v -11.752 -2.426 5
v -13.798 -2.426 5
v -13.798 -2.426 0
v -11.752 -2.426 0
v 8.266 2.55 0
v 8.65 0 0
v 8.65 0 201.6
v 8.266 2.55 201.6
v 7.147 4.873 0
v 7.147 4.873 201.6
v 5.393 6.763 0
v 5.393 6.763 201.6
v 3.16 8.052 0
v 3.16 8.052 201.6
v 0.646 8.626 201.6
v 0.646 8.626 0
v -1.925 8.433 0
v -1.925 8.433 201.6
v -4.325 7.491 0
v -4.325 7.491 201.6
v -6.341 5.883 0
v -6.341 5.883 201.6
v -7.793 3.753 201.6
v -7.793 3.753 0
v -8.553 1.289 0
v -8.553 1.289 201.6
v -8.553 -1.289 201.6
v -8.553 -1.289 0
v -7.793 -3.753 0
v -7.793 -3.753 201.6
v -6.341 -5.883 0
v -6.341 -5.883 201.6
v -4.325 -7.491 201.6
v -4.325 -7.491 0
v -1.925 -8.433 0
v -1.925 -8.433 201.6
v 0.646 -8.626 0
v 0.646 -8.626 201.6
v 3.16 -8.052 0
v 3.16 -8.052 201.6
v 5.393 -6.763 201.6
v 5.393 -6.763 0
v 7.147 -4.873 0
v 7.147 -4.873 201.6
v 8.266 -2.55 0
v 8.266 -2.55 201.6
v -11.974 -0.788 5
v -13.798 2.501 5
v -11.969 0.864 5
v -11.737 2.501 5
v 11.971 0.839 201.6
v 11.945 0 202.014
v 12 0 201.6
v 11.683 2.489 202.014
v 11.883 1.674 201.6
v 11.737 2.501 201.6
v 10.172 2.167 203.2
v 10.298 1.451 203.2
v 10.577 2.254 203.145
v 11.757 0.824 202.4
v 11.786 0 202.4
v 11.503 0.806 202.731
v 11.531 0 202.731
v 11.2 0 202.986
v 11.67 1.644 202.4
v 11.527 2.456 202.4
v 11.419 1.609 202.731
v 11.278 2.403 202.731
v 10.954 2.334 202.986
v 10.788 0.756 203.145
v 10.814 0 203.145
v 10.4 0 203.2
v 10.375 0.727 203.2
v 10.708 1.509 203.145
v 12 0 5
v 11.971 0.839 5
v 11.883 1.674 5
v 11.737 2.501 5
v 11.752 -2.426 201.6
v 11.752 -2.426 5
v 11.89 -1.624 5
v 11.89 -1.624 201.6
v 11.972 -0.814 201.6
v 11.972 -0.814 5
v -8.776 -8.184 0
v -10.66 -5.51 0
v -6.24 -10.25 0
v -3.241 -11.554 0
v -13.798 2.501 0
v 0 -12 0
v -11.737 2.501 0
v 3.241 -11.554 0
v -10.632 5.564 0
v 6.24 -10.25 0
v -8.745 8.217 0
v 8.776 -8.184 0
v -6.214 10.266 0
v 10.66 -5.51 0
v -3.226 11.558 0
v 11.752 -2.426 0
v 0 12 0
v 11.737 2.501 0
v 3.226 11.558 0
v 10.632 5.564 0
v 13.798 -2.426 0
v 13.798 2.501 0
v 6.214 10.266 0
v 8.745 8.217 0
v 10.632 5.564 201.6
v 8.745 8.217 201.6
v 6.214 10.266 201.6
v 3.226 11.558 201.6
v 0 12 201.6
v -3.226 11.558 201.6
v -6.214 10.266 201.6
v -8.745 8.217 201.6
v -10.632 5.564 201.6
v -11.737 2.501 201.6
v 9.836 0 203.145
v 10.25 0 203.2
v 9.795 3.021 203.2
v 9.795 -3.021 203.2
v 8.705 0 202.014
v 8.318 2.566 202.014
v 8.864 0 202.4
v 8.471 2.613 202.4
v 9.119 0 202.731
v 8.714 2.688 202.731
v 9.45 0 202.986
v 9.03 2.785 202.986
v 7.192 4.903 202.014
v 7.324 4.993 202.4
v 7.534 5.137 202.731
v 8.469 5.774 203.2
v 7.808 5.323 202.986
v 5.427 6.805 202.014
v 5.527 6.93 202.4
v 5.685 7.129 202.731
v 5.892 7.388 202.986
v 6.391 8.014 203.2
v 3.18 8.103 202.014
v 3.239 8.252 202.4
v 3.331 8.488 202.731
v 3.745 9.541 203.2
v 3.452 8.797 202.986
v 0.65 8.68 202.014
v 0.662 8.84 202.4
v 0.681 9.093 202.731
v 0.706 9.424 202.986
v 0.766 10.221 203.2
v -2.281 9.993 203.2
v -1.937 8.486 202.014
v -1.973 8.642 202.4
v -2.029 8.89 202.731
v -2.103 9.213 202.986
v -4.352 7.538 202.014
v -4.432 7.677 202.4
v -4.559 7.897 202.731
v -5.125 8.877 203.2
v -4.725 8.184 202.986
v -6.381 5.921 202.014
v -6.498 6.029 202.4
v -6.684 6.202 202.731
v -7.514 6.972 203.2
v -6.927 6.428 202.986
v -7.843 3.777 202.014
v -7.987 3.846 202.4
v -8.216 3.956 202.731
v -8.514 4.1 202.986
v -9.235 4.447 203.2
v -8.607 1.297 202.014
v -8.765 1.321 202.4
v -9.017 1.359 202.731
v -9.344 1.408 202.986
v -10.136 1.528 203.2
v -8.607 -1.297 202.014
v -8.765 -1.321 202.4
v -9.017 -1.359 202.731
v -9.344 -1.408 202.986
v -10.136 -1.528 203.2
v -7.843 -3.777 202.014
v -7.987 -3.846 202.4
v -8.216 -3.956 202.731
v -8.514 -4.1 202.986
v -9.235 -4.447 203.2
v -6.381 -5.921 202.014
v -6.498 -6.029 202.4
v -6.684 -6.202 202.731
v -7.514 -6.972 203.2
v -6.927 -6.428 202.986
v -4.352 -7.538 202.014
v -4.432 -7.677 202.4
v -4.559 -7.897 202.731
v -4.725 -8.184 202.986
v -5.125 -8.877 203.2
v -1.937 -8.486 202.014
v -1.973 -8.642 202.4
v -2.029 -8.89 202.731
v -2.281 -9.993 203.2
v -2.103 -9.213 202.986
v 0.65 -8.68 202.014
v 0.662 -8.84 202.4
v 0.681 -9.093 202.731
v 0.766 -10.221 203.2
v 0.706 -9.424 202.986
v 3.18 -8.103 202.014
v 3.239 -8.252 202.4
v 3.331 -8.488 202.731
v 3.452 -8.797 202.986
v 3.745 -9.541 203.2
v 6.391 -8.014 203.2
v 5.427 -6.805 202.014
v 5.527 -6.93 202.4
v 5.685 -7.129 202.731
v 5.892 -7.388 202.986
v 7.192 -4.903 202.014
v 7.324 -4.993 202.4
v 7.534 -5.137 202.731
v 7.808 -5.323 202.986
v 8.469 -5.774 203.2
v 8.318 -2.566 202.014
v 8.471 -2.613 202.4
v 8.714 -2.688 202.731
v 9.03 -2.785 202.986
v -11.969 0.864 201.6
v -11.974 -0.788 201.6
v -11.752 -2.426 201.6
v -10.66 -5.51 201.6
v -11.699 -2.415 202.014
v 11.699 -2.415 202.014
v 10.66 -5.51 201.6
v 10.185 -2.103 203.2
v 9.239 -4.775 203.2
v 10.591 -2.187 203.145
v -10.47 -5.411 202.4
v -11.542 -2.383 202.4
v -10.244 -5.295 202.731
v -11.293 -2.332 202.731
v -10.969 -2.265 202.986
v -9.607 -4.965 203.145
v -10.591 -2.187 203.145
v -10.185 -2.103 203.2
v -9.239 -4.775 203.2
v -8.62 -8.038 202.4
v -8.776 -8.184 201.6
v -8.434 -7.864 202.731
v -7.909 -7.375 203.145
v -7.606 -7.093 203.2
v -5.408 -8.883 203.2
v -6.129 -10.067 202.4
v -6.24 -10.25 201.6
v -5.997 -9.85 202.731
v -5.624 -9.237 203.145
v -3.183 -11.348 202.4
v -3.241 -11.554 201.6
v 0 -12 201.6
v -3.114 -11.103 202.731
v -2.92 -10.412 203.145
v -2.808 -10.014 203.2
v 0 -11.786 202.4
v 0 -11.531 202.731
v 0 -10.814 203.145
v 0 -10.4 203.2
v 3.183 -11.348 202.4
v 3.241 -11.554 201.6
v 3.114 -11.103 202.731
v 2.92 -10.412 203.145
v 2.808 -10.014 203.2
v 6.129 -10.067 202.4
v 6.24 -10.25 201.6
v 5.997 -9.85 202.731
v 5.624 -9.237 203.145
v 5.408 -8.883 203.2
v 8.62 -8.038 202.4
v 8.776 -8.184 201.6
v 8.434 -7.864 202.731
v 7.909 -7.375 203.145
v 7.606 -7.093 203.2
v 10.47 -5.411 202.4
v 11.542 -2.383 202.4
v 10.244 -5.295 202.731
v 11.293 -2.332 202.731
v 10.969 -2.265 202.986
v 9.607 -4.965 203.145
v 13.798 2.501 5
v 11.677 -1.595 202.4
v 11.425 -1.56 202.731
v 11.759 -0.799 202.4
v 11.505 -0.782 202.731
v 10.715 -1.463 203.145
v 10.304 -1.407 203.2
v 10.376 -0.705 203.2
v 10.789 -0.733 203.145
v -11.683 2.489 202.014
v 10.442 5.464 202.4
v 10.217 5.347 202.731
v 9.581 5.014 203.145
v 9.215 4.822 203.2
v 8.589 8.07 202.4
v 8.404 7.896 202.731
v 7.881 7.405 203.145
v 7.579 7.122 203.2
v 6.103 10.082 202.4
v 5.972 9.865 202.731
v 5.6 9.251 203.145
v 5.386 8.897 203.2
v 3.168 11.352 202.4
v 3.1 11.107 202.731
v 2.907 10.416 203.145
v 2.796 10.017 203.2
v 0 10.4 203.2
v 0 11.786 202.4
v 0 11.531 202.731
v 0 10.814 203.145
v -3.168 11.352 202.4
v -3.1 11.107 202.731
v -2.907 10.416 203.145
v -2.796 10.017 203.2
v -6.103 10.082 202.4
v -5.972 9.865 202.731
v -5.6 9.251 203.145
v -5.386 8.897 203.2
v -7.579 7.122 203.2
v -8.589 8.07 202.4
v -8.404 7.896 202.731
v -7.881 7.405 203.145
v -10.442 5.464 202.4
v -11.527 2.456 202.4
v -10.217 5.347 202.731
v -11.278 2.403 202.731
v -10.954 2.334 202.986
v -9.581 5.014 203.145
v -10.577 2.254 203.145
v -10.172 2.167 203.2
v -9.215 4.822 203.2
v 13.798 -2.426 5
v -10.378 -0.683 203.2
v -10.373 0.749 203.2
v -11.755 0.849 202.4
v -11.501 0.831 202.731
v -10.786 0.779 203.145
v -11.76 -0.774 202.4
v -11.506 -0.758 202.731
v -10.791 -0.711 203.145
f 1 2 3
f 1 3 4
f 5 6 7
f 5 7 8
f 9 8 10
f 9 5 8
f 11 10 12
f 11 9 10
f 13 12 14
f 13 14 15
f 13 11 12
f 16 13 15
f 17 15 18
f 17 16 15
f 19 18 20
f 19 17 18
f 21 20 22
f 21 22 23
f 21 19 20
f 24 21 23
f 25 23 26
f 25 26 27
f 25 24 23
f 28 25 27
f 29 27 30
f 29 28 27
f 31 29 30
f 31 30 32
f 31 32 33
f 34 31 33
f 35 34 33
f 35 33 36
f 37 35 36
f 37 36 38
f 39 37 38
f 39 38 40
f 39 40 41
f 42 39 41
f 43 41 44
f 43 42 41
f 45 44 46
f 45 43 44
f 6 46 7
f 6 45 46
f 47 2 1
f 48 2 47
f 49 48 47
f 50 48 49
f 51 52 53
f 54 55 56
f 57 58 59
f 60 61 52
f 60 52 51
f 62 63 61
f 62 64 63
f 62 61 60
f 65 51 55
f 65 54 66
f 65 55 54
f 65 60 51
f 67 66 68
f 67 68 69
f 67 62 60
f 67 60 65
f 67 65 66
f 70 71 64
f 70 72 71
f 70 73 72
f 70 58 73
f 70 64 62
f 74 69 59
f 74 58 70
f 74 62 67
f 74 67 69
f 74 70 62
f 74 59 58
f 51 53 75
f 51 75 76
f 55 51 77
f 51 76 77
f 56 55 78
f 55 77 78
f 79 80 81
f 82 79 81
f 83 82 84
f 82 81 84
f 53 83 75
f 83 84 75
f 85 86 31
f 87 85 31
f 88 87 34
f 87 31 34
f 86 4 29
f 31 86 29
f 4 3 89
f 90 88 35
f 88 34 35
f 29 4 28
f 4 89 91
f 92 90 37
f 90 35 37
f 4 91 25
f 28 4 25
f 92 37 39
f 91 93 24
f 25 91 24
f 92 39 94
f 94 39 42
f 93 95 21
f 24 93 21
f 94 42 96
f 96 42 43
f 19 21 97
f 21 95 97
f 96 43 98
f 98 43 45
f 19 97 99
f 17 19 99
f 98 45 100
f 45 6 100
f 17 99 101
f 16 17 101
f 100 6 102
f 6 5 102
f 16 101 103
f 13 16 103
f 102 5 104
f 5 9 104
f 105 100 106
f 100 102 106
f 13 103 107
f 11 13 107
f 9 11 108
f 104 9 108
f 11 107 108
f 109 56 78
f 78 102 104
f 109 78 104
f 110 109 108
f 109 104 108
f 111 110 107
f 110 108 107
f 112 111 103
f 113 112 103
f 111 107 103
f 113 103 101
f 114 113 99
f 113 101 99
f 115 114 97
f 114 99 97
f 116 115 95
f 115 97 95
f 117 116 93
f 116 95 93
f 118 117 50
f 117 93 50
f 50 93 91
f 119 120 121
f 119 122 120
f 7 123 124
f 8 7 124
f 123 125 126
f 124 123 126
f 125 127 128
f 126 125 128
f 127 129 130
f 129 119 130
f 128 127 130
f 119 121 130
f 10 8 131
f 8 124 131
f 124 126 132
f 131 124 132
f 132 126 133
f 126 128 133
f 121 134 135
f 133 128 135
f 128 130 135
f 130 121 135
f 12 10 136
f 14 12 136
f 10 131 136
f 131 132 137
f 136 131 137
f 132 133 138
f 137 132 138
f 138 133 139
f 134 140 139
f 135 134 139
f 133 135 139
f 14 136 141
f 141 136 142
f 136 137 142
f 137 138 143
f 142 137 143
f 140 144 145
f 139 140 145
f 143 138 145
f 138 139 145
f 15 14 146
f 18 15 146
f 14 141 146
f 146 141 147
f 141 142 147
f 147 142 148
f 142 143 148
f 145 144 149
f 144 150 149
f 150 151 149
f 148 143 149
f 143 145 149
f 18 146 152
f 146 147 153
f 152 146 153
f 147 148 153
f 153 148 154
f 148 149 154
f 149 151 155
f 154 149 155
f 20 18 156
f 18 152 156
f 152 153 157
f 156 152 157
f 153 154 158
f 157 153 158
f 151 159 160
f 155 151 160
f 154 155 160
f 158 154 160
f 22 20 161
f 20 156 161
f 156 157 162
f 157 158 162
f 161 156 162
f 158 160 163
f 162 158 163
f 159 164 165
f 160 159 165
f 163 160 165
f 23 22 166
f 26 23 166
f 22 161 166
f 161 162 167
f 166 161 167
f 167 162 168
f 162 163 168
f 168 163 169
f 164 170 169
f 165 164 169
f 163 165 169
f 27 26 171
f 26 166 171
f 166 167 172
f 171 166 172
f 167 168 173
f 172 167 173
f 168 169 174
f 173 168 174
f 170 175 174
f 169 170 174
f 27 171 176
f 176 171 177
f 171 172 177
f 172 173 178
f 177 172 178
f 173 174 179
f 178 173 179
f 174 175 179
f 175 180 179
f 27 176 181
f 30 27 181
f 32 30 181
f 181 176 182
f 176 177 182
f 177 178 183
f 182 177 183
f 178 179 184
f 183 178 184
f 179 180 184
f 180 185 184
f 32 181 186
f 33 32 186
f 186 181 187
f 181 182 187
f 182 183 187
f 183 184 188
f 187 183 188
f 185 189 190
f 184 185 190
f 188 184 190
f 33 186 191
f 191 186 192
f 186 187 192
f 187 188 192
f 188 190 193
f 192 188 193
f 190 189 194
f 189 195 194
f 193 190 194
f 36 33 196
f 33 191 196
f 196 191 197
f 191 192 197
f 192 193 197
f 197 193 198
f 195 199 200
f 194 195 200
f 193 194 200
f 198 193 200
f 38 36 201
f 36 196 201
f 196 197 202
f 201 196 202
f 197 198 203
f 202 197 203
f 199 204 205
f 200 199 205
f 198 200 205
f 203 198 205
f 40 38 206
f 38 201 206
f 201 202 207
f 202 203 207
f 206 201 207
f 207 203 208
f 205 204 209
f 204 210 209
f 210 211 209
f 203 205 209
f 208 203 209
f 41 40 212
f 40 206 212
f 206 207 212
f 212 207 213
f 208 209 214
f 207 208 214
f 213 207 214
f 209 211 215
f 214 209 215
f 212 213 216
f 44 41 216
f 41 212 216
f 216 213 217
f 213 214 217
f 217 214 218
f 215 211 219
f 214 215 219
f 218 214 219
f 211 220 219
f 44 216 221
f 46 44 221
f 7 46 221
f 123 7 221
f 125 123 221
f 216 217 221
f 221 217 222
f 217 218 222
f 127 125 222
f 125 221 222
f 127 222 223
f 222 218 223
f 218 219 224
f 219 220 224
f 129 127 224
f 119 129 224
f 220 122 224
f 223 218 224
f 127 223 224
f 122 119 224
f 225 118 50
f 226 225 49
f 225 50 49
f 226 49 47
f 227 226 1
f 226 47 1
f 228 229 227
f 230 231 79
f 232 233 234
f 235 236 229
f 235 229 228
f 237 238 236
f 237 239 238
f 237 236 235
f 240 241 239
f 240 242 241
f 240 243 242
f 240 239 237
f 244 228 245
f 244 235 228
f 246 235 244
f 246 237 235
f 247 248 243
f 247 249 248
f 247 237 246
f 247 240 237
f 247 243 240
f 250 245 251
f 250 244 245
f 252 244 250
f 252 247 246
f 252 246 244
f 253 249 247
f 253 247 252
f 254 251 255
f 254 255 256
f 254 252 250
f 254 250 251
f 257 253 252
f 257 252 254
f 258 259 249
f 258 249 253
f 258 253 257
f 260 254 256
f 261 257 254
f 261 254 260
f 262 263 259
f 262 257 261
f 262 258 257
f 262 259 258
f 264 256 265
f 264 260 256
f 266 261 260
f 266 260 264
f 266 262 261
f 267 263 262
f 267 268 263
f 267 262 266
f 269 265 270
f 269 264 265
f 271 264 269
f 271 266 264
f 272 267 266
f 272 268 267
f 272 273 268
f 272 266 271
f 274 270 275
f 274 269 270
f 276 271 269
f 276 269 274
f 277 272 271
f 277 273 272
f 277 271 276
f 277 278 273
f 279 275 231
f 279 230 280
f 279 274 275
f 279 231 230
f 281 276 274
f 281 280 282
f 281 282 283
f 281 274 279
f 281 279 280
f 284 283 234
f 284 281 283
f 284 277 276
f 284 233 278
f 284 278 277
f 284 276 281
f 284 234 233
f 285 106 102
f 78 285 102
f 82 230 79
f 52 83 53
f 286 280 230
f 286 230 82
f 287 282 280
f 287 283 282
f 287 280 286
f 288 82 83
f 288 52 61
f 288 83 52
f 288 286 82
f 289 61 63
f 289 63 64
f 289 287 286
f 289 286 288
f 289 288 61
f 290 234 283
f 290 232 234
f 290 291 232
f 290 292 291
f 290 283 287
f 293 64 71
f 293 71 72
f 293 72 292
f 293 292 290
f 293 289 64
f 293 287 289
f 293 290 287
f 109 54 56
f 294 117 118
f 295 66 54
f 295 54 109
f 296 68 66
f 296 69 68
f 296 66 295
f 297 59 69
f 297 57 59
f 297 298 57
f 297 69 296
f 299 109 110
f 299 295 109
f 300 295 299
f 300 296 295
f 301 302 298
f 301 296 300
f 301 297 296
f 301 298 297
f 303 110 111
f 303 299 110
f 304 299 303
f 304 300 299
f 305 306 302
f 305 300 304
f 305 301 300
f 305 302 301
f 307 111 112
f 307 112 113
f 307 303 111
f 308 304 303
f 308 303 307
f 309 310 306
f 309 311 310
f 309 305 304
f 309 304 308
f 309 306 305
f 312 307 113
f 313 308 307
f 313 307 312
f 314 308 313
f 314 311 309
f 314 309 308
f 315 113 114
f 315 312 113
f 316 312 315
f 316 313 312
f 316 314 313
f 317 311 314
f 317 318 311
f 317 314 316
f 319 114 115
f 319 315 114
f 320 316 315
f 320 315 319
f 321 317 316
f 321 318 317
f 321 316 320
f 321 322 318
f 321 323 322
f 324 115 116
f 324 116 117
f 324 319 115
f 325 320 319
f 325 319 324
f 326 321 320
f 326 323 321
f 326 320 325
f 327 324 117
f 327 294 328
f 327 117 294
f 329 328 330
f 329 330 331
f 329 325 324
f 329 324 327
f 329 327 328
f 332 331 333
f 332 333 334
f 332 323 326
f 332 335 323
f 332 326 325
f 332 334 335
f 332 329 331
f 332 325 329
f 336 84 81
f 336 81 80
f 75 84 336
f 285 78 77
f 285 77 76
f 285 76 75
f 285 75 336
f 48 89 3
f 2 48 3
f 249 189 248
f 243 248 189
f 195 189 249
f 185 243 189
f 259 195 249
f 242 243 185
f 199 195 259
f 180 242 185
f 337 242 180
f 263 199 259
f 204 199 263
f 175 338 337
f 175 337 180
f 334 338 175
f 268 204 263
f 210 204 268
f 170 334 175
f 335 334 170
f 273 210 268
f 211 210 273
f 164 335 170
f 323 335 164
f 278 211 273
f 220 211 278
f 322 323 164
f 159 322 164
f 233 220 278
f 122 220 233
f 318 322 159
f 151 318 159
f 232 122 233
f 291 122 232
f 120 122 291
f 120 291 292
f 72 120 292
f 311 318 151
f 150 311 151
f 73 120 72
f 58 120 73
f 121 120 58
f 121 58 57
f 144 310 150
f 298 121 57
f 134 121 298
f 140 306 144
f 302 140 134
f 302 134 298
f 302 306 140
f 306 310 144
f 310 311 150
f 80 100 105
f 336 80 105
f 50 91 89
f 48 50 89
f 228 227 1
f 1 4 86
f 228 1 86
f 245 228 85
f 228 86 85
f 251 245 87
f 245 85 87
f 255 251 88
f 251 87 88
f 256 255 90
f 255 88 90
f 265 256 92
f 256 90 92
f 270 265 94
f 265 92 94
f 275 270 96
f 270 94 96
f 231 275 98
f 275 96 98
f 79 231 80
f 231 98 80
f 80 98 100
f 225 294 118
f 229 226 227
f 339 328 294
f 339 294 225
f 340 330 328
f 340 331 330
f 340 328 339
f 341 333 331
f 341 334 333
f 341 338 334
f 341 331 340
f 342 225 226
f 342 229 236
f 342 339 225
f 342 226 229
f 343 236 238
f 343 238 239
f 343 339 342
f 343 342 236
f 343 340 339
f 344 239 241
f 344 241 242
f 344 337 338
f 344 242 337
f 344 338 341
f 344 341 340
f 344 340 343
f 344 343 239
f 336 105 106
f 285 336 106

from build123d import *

# Parameters (mm, degrees)
F0_R     = 8.65
F1_DEPTH = 203.2
F2_R     = 1.6
F3_DEPTH = 5


with BuildPart() as f1:
    # F0 (on Top) → F1 (new body)
    with BuildSketch(Plane.XY):
        with BuildLine():
            Line((11.736521, -2.426381), (11.736521, 2.500816))
            ThreePointArc((11.736521, 2.500816), (0, 12), (-11.736521, 2.500816))
            Line((-11.736521, 2.500816), (-11.736521, -2.426381))
            Line((-11.736521, -2.426381), (-11.752135, -2.426381))
            ThreePointArc((-11.752135, -2.426381), (0, -12), (11.752135, -2.426381))
            Line((11.752135, -2.426381), (11.736521, -2.426381))
        make_face()
        Circle(F0_R, mode=Mode.SUBTRACT)
        with BuildLine():
            Line((-11.736521, -2.426381), (-11.736521, 2.500816))
            ThreePointArc((-11.736521, 2.500816), (-11.99994, 0.038028), (-11.752135, -2.426381))
            Line((-11.752135, -2.426381), (-11.736521, -2.426381))
        make_face()
        with BuildLine():
            ThreePointArc((11.752135, -2.426381), (11.937873, -1.219504), (12, 0))
            ThreePointArc((12, 0), (11.933948, 1.257329), (11.736521, 2.500816))
            Line((11.736521, 2.500816), (11.736521, -2.426381))
            Line((11.736521, -2.426381), (11.752135, -2.426381))
        make_face()
    extrude(amount=F1_DEPTH)

    # F2
    f2_edges = [f1.edges().sort_by_distance(p)[0] for p in [
        (-11.752135, 2.426381, 203.2),
        (-8.65, 0, 203.2),
    ]]
    fillet(f2_edges, radius=F2_R)

    # F0 (on Top) → F3 (join)
    with BuildSketch(Plane.XY):
        with BuildLine():
            ThreePointArc((11.736521, 2.500816), (11.933948, 1.257329), (12, 0))
            ThreePointArc((12, 0), (11.937873, -1.219504), (11.752135, -2.426381))
            Line((11.752135, -2.426381), (13.798083, -2.426381))
            Line((13.798083, -2.426381), (13.798083, 2.500816))
            Line((13.798083, 2.500816), (11.736521, 2.500816))
        make_face()
        with BuildLine():
            ThreePointArc((-11.752135, -2.426381), (-11.99994, 0.038028), (-11.736521, 2.500816))
            Line((-11.736521, 2.500816), (-13.798083, 2.500816))
            Line((-13.798083, 2.500816), (-13.798083, -2.426381))
            Line((-13.798083, -2.426381), (-11.752135, -2.426381))
        make_face()
    extrude(amount=F3_DEPTH)


solid = f1.part
